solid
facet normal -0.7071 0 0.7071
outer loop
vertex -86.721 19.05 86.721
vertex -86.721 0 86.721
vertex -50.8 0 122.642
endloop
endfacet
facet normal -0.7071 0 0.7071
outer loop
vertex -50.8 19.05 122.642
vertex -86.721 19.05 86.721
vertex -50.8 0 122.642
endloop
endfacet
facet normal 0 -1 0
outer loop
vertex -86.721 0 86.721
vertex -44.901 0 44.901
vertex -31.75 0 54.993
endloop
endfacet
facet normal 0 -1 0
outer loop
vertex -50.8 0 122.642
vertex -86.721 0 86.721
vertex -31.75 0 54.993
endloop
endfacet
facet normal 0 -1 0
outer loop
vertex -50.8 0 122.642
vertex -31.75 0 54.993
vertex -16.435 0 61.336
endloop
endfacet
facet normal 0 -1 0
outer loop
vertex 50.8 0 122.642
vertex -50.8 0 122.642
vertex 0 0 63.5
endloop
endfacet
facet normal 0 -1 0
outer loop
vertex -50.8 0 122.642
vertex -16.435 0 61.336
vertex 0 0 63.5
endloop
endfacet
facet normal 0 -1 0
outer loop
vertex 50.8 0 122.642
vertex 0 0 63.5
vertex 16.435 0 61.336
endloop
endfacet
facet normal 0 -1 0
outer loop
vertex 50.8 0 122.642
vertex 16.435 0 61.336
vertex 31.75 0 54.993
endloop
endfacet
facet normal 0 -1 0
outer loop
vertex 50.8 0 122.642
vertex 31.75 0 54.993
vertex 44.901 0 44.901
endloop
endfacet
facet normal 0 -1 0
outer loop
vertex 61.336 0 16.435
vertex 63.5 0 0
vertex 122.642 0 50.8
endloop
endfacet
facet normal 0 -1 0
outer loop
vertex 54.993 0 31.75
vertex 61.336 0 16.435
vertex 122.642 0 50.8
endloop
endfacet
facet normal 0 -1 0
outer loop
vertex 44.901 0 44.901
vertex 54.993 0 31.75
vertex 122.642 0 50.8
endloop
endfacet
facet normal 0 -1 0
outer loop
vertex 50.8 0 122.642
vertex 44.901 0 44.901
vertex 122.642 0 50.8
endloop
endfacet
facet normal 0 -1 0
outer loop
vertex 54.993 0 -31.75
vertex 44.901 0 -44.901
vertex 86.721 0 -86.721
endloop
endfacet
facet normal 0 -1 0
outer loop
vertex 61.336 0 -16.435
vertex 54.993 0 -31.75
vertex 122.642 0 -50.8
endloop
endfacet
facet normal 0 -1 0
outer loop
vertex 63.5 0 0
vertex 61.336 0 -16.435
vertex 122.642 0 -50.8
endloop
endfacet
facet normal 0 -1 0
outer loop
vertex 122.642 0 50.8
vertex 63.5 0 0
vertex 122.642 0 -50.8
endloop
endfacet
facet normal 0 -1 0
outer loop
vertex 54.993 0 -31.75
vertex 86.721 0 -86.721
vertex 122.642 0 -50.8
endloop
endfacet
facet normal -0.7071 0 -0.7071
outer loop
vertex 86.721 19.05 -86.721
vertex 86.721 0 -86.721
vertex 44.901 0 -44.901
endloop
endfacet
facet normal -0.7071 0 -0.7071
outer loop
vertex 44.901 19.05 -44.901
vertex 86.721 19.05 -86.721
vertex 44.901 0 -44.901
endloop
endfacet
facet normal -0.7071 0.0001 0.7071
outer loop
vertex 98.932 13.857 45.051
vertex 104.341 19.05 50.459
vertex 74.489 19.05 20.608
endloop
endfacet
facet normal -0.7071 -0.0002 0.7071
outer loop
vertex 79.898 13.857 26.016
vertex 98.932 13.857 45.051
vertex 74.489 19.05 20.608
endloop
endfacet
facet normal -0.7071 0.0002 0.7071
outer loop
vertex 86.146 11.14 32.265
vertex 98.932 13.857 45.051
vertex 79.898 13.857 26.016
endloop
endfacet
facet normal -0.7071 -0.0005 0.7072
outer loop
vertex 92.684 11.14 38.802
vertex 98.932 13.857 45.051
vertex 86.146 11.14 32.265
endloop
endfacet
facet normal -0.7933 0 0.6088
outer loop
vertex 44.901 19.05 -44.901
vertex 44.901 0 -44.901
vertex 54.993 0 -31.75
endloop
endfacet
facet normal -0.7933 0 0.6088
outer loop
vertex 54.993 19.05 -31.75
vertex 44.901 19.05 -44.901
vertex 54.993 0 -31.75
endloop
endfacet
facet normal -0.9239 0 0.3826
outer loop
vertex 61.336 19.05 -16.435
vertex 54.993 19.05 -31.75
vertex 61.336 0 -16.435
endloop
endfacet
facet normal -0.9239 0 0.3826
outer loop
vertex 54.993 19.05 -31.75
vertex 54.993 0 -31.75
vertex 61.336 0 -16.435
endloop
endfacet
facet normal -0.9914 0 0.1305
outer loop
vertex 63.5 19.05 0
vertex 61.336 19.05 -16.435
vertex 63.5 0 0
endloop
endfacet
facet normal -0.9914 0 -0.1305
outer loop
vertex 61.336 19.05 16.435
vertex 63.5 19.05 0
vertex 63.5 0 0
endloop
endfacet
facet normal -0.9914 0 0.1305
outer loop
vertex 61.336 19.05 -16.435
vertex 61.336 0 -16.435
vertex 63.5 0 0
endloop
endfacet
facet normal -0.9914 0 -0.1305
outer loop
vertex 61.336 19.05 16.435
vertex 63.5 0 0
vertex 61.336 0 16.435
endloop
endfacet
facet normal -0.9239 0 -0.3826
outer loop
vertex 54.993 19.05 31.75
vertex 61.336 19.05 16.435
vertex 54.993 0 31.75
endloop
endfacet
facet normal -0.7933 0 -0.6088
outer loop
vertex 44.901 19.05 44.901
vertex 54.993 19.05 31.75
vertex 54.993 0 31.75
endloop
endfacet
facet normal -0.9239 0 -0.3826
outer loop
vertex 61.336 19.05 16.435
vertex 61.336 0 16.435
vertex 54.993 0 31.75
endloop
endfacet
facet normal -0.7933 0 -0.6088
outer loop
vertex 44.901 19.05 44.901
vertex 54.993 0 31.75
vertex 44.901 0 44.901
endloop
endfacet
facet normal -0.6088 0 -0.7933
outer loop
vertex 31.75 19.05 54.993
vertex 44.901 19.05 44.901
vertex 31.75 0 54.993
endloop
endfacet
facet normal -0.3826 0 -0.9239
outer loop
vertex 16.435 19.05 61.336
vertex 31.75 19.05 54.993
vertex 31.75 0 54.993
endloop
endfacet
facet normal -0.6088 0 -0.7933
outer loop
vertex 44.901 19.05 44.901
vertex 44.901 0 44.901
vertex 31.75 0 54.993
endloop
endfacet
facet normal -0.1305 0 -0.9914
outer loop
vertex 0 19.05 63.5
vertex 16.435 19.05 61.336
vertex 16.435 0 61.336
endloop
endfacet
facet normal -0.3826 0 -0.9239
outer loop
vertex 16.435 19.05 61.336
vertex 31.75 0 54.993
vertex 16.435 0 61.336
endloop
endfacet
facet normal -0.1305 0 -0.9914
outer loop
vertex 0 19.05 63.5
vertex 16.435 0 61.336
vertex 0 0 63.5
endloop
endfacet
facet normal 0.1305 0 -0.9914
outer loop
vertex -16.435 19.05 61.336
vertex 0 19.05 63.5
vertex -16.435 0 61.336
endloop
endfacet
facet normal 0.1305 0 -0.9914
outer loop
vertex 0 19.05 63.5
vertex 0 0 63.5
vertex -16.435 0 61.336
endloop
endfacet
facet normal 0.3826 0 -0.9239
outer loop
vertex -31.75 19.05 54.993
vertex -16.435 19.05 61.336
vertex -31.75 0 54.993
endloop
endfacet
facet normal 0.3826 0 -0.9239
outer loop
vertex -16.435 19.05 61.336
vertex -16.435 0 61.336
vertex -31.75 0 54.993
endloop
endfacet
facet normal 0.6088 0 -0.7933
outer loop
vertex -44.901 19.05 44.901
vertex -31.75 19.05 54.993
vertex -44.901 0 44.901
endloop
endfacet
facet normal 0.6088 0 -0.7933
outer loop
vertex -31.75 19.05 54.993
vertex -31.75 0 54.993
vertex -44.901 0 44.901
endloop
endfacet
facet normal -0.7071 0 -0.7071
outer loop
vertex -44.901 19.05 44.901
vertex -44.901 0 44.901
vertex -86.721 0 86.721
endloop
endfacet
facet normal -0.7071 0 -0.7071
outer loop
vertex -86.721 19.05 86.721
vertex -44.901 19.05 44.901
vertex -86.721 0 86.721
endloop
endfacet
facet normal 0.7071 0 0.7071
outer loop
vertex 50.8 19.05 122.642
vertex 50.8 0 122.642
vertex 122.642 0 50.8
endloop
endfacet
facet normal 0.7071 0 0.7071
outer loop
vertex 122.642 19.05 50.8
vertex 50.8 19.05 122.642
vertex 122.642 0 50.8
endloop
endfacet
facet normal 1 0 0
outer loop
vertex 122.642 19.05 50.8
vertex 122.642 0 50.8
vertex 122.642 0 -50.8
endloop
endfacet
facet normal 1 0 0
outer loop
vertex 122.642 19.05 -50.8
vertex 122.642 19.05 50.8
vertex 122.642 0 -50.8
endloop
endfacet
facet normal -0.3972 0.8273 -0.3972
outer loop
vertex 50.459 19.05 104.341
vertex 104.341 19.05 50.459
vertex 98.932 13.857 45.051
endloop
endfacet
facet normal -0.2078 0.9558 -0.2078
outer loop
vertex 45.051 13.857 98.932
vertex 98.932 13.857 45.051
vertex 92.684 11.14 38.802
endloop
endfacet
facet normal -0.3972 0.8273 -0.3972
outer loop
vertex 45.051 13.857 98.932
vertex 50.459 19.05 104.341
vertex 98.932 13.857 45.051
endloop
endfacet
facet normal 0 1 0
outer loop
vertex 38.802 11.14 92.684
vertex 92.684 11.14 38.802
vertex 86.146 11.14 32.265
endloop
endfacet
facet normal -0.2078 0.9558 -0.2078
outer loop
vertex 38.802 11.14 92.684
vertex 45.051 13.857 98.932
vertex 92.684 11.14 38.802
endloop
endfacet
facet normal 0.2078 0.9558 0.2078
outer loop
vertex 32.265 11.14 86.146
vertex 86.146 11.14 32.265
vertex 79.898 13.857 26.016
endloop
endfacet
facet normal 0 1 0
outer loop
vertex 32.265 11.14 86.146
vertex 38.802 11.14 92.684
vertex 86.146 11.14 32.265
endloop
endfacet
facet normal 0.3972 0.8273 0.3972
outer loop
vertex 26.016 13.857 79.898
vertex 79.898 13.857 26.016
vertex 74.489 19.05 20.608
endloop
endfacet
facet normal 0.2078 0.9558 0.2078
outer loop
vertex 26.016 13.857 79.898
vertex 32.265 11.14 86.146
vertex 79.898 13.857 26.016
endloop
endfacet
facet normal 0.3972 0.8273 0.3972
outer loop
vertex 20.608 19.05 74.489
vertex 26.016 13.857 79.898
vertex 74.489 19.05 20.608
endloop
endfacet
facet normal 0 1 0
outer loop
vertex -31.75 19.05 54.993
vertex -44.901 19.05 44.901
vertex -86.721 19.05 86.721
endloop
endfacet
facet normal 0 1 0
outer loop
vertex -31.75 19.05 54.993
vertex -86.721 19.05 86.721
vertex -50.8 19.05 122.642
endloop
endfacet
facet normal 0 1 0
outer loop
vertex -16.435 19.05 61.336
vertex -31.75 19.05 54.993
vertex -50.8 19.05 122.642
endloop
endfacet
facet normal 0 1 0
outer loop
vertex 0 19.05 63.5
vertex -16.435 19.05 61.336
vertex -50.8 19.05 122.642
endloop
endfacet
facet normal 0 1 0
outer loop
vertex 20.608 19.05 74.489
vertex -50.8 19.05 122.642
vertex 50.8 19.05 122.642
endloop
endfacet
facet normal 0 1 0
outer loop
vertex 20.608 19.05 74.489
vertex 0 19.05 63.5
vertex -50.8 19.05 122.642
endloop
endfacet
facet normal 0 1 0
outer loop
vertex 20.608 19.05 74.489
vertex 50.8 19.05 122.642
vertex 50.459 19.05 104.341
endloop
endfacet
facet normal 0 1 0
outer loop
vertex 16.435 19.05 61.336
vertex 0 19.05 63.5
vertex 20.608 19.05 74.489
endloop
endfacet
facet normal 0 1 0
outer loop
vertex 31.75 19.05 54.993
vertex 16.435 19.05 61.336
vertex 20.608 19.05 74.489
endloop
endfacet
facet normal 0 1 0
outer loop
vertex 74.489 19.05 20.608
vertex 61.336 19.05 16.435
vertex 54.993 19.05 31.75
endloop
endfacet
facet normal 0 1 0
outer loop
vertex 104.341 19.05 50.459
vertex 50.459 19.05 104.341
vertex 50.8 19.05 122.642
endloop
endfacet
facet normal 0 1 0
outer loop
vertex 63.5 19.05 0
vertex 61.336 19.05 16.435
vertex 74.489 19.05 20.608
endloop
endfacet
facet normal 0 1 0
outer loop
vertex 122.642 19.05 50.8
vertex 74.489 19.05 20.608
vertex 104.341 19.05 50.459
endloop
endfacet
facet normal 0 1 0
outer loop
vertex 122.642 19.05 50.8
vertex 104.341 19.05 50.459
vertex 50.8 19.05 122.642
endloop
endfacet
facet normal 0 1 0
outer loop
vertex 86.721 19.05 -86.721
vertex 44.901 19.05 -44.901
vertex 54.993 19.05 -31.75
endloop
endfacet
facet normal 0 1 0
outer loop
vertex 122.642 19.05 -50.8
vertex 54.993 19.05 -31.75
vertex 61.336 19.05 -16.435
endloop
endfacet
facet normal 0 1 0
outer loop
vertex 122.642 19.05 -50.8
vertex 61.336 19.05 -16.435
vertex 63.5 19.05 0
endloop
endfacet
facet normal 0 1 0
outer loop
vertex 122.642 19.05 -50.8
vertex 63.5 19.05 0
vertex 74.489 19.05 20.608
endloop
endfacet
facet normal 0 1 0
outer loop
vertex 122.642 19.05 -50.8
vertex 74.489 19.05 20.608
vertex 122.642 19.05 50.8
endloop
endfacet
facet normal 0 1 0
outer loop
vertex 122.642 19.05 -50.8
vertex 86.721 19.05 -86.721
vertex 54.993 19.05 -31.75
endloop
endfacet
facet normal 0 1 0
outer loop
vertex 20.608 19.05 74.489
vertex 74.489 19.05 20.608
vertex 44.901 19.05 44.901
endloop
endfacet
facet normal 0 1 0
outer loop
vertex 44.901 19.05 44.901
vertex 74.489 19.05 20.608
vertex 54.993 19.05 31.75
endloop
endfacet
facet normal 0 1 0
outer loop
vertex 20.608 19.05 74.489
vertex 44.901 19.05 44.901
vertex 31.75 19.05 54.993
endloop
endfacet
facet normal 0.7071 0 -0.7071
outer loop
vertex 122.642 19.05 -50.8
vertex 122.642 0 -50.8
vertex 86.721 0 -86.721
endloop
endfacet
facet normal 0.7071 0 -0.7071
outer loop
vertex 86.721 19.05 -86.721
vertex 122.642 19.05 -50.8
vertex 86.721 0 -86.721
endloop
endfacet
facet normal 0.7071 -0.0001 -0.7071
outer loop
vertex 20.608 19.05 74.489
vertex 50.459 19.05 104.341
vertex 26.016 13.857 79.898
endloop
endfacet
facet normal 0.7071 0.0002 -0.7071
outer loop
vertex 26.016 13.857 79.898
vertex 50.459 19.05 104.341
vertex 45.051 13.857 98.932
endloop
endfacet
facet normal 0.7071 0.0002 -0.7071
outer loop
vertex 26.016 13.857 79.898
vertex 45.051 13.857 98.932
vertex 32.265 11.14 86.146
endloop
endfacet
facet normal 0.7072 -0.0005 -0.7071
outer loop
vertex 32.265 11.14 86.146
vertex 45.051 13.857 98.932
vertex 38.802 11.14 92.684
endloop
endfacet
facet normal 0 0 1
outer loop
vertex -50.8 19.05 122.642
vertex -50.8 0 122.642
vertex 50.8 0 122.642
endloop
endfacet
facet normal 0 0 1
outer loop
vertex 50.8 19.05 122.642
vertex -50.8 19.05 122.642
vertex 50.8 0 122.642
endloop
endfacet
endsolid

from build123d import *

# Parameters (mm, degrees)
STOCK_A_0101_1_DEPTH    = 19.05
CUT_EXTRUDE1_DEPTH      = 38.1
CUT_EXTRUDE1_DEPTH_BACK = 38.1
SKETCH1_R               = 31.115


# Read off the part's stored shape, not the designer's step: Stock-A-0101-1
with BuildPart() as part:
    # Stock-A-0101-1 outline → Stock-A-0101-1 (new body)
    with BuildSketch(Plane(origin=(0, 0, 0), x_dir=(1, 0, 0), z_dir=(0, 1, 0))):
        with BuildLine():
            Line((86.721024484, 86.721024484), (44.901280605, 44.901280605))
            ThreePointArc((44.901280605, 44.901280605), (44.901280605, -44.901280605), (-44.901280605, -44.901280605))
            Line((-44.901280605, -44.901280605), (-86.721024484, -86.721024484))
            Line((-86.721024484, -86.721024484), (-50.8, -122.642048969))
            Line((-50.8, -122.642048969), (50.8, -122.642048969))
            Line((50.8, -122.642048969), (122.642048969, -50.8))
            Line((122.642048969, -50.8), (122.642048969, 50.8))
            Line((122.642048969, 50.8), (86.721024484, 86.721024484))
        make_face()
    extrude(amount=STOCK_A_0101_1_DEPTH)

    # Sketch1 → Cut-Extrude1 (cut, two sides: drawn at the far end of the back side and taken through both)
    with BuildSketch(Plane(origin=(0, 0, 0), x_dir=(-0.7071067811865475, 0, -0.7071067811865477), z_dir=(0.7071067811865477, 0, -0.7071067811865475)).offset(-CUT_EXTRUDE1_DEPTH_BACK)):
        with Locations((-88.352048969, 41.91)):
            Circle(SKETCH1_R)
    extrude(amount=CUT_EXTRUDE1_DEPTH + CUT_EXTRUDE1_DEPTH_BACK, mode=Mode.SUBTRACT)


solid = part.part
